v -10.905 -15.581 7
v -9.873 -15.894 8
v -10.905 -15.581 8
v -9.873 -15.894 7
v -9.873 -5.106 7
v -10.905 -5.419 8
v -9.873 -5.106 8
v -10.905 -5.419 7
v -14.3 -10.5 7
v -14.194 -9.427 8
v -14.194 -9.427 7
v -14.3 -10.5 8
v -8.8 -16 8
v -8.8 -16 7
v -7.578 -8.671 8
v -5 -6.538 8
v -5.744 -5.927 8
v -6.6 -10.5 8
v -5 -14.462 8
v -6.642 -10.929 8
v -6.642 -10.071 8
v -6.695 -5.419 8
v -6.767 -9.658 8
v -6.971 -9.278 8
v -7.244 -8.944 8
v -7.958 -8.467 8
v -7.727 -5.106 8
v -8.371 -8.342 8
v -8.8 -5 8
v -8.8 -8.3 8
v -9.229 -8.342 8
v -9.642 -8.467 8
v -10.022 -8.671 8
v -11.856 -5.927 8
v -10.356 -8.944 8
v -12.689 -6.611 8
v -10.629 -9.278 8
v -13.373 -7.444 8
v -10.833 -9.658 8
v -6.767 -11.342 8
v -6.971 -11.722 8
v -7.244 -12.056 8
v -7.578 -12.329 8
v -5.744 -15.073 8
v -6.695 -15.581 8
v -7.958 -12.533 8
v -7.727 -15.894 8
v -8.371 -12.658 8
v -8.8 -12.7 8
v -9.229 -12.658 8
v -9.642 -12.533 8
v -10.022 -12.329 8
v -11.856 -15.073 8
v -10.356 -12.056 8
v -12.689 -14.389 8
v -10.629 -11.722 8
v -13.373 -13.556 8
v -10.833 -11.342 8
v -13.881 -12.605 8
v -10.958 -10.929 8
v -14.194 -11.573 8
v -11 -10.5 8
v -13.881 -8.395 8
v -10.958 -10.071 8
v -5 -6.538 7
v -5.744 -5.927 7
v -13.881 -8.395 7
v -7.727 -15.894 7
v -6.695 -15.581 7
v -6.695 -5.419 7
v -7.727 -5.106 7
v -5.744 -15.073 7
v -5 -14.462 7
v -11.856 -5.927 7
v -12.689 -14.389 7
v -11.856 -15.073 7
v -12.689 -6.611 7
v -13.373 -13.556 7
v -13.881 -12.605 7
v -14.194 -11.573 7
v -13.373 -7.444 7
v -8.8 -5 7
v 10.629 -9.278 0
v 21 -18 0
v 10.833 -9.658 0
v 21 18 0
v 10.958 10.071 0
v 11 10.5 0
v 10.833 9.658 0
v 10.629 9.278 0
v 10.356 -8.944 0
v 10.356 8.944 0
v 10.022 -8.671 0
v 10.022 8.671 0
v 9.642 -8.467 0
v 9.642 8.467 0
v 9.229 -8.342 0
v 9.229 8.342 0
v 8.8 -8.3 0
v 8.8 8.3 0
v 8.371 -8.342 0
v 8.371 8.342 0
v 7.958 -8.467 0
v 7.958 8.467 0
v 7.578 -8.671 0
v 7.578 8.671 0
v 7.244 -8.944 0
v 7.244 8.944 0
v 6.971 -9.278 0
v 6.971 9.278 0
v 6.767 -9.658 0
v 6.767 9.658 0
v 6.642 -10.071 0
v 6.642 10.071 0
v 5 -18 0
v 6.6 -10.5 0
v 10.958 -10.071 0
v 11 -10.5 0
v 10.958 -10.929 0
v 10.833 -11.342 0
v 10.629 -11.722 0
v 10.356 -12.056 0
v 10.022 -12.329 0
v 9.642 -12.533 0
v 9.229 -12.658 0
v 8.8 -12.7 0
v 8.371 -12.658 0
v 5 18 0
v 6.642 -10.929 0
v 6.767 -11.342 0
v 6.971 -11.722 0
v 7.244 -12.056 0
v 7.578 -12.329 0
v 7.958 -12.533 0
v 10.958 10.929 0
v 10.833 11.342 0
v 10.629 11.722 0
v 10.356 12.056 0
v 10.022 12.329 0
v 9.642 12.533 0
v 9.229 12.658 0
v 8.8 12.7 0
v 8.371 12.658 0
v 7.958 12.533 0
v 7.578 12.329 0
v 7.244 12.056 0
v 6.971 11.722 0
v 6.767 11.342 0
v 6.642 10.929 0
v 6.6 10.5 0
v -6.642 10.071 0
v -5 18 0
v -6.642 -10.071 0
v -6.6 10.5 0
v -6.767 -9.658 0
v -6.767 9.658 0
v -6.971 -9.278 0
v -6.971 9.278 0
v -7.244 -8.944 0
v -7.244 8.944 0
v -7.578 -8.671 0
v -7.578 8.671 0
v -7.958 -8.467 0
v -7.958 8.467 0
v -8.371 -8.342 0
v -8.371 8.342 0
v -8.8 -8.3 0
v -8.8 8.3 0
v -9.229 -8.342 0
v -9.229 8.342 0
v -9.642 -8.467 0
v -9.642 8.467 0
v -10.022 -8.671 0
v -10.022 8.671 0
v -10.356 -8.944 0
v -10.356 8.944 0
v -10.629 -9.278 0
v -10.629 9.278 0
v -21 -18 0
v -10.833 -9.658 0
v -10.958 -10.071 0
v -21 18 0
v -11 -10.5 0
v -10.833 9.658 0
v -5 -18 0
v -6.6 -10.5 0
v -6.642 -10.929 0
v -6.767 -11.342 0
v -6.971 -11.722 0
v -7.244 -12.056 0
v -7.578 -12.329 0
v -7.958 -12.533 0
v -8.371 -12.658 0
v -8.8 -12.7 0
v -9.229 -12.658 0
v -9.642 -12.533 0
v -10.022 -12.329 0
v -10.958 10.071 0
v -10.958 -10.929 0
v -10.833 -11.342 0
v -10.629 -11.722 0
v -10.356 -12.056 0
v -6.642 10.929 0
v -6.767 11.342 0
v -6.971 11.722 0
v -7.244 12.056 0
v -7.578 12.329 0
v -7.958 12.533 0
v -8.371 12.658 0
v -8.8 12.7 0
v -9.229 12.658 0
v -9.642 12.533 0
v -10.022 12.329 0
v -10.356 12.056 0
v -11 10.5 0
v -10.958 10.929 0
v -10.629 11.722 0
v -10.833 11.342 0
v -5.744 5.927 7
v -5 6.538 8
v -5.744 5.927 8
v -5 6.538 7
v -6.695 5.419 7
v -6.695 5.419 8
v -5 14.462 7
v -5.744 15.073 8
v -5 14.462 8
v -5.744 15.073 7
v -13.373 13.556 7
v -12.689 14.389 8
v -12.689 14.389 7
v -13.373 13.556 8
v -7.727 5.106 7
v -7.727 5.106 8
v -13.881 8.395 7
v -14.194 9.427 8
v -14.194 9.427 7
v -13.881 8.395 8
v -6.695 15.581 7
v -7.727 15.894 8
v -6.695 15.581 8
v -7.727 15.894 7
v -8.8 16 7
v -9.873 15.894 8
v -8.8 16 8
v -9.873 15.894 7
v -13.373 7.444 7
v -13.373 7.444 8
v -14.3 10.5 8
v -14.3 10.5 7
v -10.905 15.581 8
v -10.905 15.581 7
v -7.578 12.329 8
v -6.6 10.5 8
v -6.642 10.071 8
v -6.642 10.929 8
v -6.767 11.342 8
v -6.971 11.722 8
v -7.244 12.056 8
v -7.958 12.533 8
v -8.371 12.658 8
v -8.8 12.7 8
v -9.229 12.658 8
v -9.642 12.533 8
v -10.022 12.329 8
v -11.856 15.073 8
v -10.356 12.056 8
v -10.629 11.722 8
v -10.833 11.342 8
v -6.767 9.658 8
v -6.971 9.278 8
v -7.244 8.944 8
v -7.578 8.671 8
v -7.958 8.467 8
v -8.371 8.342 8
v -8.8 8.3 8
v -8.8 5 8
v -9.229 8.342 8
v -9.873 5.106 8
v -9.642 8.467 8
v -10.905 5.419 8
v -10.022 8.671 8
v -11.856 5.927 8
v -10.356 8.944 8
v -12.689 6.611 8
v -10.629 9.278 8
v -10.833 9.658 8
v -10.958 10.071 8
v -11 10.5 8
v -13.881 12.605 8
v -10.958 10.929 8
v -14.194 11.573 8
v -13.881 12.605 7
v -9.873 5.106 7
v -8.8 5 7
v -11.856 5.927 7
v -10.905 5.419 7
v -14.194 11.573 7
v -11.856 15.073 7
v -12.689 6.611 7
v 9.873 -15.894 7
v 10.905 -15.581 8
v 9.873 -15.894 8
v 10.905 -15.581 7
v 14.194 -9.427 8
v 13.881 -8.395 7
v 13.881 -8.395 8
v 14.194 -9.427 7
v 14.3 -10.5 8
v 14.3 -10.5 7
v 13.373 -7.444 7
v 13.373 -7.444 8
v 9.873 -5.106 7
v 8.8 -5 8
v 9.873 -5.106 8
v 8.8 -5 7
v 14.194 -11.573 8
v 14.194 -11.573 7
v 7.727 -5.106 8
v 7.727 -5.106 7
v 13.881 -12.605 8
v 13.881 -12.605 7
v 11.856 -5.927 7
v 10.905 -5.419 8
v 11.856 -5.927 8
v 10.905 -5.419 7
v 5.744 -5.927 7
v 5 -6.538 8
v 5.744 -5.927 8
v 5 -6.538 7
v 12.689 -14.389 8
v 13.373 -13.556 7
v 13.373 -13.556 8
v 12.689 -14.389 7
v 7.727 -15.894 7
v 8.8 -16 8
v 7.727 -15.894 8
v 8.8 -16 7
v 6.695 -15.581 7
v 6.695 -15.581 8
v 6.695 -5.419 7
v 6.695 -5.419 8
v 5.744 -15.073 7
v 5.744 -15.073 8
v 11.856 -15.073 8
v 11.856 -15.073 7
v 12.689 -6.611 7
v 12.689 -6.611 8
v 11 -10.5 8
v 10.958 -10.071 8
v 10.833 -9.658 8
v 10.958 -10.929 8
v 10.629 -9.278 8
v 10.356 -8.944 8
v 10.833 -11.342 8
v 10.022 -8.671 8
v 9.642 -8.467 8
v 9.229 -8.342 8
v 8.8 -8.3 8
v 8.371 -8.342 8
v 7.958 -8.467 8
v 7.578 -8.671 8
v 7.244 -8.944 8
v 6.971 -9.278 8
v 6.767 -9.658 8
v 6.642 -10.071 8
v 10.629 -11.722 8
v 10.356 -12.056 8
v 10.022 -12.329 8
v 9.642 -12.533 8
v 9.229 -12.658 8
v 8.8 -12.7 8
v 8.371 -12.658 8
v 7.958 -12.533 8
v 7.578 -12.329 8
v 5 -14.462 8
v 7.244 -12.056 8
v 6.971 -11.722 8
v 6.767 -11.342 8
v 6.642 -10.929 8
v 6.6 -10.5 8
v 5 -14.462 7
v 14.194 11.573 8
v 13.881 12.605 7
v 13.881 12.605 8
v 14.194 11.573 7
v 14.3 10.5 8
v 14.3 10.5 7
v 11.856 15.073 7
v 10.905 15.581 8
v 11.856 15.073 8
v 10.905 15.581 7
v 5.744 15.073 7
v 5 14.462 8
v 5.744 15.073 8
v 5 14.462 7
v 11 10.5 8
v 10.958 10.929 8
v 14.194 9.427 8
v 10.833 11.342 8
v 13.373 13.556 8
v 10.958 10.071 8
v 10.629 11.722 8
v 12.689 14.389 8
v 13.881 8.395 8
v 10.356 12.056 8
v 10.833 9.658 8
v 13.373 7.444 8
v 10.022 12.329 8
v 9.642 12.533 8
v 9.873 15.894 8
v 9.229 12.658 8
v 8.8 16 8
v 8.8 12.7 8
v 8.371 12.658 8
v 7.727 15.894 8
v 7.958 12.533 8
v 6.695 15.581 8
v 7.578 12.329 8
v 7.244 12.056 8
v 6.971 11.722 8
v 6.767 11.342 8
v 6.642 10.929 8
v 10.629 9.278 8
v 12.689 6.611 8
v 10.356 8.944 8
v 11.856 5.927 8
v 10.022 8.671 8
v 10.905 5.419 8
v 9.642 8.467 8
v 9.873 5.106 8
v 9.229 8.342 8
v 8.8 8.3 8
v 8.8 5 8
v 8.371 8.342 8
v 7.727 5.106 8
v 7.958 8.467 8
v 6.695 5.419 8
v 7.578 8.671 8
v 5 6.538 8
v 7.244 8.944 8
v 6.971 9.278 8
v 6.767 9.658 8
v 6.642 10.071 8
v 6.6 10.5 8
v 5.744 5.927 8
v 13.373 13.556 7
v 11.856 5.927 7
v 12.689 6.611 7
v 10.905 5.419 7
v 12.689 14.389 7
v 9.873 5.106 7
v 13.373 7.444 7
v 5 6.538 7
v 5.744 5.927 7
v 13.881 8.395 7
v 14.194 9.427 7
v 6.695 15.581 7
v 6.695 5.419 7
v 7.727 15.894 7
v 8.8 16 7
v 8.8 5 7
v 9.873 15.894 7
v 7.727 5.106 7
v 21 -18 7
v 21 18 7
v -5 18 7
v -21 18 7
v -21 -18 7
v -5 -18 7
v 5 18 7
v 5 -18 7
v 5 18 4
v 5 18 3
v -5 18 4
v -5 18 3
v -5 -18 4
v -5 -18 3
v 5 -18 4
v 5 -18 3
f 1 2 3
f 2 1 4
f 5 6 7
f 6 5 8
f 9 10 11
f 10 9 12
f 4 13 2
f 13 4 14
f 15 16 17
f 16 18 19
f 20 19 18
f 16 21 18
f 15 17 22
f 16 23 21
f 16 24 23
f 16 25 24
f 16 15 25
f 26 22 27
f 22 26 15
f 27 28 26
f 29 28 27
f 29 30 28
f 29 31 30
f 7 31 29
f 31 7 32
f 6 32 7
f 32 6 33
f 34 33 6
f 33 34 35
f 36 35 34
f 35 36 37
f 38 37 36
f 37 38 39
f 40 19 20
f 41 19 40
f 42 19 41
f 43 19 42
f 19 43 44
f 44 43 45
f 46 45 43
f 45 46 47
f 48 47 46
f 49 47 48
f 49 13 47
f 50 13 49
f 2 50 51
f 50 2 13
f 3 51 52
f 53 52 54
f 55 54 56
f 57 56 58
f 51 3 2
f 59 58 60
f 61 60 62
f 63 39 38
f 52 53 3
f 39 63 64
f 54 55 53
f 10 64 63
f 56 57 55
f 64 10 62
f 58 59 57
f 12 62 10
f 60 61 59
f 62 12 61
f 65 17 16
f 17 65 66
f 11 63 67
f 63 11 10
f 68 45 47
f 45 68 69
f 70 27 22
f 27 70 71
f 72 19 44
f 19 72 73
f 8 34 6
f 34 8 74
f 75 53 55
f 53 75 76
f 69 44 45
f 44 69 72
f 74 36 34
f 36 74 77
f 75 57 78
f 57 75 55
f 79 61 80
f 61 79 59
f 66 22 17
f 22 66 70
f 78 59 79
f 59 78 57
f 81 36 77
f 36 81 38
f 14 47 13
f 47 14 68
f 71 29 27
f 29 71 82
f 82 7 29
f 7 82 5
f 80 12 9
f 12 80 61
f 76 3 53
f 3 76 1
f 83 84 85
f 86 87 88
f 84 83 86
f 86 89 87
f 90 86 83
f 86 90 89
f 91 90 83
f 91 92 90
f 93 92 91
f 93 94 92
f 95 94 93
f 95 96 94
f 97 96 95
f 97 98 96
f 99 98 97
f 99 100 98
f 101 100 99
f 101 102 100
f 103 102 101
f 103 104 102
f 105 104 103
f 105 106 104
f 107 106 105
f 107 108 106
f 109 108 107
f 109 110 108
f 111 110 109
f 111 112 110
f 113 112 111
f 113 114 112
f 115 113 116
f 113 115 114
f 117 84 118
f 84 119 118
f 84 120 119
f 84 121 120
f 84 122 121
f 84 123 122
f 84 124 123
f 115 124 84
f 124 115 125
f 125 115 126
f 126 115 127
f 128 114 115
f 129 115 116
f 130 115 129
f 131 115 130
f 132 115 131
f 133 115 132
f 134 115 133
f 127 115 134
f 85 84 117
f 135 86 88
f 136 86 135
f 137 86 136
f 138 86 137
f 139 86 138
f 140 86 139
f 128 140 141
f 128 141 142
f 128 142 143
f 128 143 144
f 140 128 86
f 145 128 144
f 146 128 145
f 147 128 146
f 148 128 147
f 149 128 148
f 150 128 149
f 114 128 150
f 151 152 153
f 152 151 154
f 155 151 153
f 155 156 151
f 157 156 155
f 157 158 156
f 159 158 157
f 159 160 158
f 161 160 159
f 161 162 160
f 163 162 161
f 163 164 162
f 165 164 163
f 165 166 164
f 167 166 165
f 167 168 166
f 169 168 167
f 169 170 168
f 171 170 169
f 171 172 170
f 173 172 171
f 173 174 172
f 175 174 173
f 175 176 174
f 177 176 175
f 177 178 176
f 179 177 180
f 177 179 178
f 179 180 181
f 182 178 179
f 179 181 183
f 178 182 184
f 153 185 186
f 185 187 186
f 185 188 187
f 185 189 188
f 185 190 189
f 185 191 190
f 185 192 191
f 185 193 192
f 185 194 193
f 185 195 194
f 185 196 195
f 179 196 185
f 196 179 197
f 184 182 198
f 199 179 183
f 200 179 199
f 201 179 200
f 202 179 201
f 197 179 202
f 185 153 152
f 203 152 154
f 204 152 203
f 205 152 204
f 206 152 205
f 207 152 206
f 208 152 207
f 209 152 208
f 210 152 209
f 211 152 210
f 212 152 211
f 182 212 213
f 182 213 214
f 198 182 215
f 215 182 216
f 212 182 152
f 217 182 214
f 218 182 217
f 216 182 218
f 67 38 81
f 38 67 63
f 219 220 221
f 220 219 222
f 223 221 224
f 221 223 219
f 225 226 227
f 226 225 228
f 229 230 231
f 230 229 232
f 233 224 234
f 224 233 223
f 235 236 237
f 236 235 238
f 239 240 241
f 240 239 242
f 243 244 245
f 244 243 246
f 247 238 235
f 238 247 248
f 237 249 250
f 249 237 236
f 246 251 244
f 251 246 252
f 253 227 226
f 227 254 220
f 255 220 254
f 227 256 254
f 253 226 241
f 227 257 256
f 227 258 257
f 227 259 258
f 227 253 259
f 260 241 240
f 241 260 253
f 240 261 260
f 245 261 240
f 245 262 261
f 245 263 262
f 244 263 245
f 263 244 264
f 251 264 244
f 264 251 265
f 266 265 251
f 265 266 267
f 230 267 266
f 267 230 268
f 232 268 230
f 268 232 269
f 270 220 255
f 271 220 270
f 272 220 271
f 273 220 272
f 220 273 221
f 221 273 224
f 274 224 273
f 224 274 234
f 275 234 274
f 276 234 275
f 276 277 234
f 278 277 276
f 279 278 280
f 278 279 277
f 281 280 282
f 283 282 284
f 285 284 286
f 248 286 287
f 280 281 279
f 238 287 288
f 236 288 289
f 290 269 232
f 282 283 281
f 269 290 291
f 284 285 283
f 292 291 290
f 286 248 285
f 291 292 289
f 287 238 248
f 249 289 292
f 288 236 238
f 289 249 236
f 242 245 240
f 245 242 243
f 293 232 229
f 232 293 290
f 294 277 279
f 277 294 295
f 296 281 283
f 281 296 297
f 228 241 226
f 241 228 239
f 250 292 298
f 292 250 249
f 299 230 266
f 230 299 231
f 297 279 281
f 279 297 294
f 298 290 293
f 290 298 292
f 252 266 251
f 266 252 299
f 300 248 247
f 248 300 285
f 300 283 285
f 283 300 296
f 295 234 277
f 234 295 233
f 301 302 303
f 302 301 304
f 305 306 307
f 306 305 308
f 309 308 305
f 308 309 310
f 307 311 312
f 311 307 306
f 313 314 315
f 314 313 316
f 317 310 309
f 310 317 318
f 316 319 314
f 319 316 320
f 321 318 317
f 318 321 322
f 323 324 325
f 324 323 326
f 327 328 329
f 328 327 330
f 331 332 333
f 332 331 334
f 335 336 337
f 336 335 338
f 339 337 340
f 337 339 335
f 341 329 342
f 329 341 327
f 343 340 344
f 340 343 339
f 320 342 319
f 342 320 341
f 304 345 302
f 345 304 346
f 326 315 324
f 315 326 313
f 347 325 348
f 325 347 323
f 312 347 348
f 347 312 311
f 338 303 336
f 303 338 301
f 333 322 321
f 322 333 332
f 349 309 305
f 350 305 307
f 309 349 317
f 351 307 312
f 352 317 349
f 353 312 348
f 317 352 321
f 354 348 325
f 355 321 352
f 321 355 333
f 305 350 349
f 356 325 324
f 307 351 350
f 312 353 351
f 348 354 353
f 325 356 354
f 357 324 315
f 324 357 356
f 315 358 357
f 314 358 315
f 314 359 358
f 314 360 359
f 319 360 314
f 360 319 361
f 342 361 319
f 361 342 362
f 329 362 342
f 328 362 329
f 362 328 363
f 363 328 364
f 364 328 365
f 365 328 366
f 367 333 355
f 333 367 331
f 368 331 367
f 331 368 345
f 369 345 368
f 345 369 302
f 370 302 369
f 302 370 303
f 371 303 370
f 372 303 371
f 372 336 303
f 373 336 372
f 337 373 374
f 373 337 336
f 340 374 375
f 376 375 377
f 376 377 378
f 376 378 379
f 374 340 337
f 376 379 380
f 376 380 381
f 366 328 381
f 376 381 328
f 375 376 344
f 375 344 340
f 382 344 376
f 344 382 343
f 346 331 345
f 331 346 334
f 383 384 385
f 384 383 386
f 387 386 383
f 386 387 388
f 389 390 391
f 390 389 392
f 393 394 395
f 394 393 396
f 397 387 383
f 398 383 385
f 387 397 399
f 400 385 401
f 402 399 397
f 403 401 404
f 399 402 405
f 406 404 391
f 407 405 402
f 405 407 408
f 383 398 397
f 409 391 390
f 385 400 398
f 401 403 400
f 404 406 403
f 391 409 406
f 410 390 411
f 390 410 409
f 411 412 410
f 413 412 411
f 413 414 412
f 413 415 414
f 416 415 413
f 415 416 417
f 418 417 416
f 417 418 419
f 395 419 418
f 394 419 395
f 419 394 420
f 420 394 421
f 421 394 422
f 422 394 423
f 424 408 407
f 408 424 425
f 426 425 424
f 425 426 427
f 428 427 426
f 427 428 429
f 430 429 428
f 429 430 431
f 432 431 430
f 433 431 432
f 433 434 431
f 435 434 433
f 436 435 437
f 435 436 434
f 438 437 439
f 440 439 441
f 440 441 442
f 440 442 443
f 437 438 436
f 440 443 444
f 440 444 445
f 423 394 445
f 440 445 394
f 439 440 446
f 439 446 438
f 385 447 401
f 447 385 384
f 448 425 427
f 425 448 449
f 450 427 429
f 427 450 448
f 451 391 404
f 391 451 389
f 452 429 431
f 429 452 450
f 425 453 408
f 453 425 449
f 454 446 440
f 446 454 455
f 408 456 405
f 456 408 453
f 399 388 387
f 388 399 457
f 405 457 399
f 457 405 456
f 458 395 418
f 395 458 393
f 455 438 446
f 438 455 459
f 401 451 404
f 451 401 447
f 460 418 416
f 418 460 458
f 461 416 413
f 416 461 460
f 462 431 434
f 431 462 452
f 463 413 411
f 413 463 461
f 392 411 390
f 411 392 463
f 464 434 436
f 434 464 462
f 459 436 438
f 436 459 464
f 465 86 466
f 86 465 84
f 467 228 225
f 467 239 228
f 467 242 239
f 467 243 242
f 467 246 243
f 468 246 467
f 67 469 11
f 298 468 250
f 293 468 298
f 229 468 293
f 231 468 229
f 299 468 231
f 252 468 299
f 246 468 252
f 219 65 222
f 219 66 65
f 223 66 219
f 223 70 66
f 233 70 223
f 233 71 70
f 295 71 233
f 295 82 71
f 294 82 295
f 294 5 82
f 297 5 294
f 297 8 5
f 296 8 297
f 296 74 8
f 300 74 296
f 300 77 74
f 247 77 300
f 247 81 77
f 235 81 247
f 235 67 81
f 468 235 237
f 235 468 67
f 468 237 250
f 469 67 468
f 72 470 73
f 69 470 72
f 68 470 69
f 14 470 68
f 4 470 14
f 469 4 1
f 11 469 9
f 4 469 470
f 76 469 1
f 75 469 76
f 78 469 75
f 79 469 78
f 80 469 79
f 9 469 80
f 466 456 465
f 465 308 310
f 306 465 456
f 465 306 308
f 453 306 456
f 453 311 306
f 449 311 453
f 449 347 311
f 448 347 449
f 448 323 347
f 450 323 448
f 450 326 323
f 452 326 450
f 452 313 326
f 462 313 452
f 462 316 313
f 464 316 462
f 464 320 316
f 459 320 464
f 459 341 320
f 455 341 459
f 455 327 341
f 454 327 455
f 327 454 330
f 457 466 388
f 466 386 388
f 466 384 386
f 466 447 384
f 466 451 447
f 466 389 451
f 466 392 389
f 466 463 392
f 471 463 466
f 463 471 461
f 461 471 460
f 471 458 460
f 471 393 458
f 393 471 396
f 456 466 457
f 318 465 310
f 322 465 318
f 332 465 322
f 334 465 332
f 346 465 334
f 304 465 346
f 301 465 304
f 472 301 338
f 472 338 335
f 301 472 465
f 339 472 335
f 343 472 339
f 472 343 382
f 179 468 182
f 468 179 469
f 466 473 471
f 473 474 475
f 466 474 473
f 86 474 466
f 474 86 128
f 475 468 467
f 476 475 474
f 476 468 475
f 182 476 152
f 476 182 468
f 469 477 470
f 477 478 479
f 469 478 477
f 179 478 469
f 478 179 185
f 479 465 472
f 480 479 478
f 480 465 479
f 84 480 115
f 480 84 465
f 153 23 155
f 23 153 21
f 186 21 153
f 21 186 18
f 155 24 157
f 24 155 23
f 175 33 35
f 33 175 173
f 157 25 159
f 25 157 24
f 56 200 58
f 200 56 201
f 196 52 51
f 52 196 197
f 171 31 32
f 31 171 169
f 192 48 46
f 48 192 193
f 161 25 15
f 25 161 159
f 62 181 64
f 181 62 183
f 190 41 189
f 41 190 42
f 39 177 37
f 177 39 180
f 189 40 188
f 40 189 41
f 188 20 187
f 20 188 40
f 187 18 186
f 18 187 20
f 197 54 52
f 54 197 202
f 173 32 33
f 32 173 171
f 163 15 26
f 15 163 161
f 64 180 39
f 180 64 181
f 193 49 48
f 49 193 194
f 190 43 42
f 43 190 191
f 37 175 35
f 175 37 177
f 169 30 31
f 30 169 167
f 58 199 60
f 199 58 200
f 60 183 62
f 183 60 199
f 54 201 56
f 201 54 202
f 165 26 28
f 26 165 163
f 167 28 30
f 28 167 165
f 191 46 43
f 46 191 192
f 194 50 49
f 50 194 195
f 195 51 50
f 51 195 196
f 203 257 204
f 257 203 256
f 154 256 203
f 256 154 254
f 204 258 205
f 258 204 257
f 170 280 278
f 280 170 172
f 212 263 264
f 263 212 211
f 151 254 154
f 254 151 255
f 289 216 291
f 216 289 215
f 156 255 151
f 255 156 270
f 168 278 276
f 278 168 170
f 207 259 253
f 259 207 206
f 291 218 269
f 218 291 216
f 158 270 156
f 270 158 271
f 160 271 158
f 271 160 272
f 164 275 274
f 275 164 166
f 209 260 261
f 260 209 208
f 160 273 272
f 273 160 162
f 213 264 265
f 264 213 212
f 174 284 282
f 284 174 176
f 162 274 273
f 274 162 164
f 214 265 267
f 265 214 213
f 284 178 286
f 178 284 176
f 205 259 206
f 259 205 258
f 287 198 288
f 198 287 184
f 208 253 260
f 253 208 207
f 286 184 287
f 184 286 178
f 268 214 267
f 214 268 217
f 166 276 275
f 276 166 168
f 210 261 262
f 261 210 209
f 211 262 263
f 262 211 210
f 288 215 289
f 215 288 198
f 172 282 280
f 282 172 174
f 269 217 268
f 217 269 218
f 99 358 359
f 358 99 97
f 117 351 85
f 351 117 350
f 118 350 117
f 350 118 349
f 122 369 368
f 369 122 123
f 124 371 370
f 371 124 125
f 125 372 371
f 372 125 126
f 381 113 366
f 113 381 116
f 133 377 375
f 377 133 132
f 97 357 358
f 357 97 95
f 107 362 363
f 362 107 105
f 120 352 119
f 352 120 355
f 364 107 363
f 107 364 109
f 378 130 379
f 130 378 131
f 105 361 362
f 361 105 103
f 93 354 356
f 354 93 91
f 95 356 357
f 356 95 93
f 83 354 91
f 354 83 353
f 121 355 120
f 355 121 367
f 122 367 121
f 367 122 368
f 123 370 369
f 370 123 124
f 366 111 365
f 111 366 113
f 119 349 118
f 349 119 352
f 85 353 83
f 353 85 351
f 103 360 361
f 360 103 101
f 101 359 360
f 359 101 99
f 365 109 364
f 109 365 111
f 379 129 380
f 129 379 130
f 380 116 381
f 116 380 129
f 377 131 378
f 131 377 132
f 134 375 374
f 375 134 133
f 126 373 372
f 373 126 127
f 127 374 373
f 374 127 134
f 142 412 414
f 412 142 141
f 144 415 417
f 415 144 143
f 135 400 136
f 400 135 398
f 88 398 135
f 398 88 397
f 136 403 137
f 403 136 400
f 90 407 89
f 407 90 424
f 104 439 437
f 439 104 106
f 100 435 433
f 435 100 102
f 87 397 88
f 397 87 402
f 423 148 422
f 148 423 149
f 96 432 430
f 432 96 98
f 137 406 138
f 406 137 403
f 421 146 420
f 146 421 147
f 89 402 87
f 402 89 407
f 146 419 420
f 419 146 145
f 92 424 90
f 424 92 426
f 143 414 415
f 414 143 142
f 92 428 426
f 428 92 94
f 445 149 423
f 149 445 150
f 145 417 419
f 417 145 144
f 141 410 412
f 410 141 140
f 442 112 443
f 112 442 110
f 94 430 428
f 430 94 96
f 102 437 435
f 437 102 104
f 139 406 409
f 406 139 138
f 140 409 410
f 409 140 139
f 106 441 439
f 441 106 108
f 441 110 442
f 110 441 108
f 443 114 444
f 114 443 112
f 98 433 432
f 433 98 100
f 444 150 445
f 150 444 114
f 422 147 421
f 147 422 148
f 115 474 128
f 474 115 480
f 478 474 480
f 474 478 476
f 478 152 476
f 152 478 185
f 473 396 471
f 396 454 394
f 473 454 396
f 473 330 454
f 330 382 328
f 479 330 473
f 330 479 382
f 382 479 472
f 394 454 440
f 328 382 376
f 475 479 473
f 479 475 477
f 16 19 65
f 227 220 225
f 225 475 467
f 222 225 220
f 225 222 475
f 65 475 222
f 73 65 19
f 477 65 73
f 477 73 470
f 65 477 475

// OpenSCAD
$fn = 32;

// ----------------------------------------------------------------------
// Living hinge: 42 x 36 mm plates, 1 mm flexible web
// ----------------------------------------------------------------------

// --- parameters (mm) ---
plate_len = 16;           // plate length outside the web
plate_w = 36;             // plate width
thick = 7;                // plate thickness
web_half = 5;             // half width of the flex band
web_t = 1;                // flexible web thickness
web_z = 3;                // web position inside the thickness
boss_d = 11;              // screw boss diameter
boss_h = 8;               // screw boss height
boss_x = 8.8;             // screw boss distance from the web
screw_d = 4.4;            // screw hole

difference() {
  union() {
    /* one flat strip, later thinned at the middle */
    translate([-21, -18, 0]) cube([42, 36, 7]);
    /* screw bosses, sunk 0.5 mm into the plates */
    for (sx = [-8.8, 8.8]) {
      for (sy = [-10.5, 10.5]) {
        translate([sx, sy, 0]) cylinder(h = boss_h, d = boss_d);
      }
    }
  }
  /* channel from below: leaves the web on top of it */
  translate([-5, -20.5, -2.5]) cube([10, 41, 5.5]);
  /* channel from above: thins the web down to web_t */
  translate([-5, -20.5, 4]) cube([10, 41, 5.5]);
  /* screw holes through the bosses */
  for (sx = [-8.8, 8.8]) {
    for (sy = [-10.5, 10.5]) {
      translate([sx, sy, -2.5]) cylinder(h = boss_h + 5, d = screw_d);
    }
  }
}
